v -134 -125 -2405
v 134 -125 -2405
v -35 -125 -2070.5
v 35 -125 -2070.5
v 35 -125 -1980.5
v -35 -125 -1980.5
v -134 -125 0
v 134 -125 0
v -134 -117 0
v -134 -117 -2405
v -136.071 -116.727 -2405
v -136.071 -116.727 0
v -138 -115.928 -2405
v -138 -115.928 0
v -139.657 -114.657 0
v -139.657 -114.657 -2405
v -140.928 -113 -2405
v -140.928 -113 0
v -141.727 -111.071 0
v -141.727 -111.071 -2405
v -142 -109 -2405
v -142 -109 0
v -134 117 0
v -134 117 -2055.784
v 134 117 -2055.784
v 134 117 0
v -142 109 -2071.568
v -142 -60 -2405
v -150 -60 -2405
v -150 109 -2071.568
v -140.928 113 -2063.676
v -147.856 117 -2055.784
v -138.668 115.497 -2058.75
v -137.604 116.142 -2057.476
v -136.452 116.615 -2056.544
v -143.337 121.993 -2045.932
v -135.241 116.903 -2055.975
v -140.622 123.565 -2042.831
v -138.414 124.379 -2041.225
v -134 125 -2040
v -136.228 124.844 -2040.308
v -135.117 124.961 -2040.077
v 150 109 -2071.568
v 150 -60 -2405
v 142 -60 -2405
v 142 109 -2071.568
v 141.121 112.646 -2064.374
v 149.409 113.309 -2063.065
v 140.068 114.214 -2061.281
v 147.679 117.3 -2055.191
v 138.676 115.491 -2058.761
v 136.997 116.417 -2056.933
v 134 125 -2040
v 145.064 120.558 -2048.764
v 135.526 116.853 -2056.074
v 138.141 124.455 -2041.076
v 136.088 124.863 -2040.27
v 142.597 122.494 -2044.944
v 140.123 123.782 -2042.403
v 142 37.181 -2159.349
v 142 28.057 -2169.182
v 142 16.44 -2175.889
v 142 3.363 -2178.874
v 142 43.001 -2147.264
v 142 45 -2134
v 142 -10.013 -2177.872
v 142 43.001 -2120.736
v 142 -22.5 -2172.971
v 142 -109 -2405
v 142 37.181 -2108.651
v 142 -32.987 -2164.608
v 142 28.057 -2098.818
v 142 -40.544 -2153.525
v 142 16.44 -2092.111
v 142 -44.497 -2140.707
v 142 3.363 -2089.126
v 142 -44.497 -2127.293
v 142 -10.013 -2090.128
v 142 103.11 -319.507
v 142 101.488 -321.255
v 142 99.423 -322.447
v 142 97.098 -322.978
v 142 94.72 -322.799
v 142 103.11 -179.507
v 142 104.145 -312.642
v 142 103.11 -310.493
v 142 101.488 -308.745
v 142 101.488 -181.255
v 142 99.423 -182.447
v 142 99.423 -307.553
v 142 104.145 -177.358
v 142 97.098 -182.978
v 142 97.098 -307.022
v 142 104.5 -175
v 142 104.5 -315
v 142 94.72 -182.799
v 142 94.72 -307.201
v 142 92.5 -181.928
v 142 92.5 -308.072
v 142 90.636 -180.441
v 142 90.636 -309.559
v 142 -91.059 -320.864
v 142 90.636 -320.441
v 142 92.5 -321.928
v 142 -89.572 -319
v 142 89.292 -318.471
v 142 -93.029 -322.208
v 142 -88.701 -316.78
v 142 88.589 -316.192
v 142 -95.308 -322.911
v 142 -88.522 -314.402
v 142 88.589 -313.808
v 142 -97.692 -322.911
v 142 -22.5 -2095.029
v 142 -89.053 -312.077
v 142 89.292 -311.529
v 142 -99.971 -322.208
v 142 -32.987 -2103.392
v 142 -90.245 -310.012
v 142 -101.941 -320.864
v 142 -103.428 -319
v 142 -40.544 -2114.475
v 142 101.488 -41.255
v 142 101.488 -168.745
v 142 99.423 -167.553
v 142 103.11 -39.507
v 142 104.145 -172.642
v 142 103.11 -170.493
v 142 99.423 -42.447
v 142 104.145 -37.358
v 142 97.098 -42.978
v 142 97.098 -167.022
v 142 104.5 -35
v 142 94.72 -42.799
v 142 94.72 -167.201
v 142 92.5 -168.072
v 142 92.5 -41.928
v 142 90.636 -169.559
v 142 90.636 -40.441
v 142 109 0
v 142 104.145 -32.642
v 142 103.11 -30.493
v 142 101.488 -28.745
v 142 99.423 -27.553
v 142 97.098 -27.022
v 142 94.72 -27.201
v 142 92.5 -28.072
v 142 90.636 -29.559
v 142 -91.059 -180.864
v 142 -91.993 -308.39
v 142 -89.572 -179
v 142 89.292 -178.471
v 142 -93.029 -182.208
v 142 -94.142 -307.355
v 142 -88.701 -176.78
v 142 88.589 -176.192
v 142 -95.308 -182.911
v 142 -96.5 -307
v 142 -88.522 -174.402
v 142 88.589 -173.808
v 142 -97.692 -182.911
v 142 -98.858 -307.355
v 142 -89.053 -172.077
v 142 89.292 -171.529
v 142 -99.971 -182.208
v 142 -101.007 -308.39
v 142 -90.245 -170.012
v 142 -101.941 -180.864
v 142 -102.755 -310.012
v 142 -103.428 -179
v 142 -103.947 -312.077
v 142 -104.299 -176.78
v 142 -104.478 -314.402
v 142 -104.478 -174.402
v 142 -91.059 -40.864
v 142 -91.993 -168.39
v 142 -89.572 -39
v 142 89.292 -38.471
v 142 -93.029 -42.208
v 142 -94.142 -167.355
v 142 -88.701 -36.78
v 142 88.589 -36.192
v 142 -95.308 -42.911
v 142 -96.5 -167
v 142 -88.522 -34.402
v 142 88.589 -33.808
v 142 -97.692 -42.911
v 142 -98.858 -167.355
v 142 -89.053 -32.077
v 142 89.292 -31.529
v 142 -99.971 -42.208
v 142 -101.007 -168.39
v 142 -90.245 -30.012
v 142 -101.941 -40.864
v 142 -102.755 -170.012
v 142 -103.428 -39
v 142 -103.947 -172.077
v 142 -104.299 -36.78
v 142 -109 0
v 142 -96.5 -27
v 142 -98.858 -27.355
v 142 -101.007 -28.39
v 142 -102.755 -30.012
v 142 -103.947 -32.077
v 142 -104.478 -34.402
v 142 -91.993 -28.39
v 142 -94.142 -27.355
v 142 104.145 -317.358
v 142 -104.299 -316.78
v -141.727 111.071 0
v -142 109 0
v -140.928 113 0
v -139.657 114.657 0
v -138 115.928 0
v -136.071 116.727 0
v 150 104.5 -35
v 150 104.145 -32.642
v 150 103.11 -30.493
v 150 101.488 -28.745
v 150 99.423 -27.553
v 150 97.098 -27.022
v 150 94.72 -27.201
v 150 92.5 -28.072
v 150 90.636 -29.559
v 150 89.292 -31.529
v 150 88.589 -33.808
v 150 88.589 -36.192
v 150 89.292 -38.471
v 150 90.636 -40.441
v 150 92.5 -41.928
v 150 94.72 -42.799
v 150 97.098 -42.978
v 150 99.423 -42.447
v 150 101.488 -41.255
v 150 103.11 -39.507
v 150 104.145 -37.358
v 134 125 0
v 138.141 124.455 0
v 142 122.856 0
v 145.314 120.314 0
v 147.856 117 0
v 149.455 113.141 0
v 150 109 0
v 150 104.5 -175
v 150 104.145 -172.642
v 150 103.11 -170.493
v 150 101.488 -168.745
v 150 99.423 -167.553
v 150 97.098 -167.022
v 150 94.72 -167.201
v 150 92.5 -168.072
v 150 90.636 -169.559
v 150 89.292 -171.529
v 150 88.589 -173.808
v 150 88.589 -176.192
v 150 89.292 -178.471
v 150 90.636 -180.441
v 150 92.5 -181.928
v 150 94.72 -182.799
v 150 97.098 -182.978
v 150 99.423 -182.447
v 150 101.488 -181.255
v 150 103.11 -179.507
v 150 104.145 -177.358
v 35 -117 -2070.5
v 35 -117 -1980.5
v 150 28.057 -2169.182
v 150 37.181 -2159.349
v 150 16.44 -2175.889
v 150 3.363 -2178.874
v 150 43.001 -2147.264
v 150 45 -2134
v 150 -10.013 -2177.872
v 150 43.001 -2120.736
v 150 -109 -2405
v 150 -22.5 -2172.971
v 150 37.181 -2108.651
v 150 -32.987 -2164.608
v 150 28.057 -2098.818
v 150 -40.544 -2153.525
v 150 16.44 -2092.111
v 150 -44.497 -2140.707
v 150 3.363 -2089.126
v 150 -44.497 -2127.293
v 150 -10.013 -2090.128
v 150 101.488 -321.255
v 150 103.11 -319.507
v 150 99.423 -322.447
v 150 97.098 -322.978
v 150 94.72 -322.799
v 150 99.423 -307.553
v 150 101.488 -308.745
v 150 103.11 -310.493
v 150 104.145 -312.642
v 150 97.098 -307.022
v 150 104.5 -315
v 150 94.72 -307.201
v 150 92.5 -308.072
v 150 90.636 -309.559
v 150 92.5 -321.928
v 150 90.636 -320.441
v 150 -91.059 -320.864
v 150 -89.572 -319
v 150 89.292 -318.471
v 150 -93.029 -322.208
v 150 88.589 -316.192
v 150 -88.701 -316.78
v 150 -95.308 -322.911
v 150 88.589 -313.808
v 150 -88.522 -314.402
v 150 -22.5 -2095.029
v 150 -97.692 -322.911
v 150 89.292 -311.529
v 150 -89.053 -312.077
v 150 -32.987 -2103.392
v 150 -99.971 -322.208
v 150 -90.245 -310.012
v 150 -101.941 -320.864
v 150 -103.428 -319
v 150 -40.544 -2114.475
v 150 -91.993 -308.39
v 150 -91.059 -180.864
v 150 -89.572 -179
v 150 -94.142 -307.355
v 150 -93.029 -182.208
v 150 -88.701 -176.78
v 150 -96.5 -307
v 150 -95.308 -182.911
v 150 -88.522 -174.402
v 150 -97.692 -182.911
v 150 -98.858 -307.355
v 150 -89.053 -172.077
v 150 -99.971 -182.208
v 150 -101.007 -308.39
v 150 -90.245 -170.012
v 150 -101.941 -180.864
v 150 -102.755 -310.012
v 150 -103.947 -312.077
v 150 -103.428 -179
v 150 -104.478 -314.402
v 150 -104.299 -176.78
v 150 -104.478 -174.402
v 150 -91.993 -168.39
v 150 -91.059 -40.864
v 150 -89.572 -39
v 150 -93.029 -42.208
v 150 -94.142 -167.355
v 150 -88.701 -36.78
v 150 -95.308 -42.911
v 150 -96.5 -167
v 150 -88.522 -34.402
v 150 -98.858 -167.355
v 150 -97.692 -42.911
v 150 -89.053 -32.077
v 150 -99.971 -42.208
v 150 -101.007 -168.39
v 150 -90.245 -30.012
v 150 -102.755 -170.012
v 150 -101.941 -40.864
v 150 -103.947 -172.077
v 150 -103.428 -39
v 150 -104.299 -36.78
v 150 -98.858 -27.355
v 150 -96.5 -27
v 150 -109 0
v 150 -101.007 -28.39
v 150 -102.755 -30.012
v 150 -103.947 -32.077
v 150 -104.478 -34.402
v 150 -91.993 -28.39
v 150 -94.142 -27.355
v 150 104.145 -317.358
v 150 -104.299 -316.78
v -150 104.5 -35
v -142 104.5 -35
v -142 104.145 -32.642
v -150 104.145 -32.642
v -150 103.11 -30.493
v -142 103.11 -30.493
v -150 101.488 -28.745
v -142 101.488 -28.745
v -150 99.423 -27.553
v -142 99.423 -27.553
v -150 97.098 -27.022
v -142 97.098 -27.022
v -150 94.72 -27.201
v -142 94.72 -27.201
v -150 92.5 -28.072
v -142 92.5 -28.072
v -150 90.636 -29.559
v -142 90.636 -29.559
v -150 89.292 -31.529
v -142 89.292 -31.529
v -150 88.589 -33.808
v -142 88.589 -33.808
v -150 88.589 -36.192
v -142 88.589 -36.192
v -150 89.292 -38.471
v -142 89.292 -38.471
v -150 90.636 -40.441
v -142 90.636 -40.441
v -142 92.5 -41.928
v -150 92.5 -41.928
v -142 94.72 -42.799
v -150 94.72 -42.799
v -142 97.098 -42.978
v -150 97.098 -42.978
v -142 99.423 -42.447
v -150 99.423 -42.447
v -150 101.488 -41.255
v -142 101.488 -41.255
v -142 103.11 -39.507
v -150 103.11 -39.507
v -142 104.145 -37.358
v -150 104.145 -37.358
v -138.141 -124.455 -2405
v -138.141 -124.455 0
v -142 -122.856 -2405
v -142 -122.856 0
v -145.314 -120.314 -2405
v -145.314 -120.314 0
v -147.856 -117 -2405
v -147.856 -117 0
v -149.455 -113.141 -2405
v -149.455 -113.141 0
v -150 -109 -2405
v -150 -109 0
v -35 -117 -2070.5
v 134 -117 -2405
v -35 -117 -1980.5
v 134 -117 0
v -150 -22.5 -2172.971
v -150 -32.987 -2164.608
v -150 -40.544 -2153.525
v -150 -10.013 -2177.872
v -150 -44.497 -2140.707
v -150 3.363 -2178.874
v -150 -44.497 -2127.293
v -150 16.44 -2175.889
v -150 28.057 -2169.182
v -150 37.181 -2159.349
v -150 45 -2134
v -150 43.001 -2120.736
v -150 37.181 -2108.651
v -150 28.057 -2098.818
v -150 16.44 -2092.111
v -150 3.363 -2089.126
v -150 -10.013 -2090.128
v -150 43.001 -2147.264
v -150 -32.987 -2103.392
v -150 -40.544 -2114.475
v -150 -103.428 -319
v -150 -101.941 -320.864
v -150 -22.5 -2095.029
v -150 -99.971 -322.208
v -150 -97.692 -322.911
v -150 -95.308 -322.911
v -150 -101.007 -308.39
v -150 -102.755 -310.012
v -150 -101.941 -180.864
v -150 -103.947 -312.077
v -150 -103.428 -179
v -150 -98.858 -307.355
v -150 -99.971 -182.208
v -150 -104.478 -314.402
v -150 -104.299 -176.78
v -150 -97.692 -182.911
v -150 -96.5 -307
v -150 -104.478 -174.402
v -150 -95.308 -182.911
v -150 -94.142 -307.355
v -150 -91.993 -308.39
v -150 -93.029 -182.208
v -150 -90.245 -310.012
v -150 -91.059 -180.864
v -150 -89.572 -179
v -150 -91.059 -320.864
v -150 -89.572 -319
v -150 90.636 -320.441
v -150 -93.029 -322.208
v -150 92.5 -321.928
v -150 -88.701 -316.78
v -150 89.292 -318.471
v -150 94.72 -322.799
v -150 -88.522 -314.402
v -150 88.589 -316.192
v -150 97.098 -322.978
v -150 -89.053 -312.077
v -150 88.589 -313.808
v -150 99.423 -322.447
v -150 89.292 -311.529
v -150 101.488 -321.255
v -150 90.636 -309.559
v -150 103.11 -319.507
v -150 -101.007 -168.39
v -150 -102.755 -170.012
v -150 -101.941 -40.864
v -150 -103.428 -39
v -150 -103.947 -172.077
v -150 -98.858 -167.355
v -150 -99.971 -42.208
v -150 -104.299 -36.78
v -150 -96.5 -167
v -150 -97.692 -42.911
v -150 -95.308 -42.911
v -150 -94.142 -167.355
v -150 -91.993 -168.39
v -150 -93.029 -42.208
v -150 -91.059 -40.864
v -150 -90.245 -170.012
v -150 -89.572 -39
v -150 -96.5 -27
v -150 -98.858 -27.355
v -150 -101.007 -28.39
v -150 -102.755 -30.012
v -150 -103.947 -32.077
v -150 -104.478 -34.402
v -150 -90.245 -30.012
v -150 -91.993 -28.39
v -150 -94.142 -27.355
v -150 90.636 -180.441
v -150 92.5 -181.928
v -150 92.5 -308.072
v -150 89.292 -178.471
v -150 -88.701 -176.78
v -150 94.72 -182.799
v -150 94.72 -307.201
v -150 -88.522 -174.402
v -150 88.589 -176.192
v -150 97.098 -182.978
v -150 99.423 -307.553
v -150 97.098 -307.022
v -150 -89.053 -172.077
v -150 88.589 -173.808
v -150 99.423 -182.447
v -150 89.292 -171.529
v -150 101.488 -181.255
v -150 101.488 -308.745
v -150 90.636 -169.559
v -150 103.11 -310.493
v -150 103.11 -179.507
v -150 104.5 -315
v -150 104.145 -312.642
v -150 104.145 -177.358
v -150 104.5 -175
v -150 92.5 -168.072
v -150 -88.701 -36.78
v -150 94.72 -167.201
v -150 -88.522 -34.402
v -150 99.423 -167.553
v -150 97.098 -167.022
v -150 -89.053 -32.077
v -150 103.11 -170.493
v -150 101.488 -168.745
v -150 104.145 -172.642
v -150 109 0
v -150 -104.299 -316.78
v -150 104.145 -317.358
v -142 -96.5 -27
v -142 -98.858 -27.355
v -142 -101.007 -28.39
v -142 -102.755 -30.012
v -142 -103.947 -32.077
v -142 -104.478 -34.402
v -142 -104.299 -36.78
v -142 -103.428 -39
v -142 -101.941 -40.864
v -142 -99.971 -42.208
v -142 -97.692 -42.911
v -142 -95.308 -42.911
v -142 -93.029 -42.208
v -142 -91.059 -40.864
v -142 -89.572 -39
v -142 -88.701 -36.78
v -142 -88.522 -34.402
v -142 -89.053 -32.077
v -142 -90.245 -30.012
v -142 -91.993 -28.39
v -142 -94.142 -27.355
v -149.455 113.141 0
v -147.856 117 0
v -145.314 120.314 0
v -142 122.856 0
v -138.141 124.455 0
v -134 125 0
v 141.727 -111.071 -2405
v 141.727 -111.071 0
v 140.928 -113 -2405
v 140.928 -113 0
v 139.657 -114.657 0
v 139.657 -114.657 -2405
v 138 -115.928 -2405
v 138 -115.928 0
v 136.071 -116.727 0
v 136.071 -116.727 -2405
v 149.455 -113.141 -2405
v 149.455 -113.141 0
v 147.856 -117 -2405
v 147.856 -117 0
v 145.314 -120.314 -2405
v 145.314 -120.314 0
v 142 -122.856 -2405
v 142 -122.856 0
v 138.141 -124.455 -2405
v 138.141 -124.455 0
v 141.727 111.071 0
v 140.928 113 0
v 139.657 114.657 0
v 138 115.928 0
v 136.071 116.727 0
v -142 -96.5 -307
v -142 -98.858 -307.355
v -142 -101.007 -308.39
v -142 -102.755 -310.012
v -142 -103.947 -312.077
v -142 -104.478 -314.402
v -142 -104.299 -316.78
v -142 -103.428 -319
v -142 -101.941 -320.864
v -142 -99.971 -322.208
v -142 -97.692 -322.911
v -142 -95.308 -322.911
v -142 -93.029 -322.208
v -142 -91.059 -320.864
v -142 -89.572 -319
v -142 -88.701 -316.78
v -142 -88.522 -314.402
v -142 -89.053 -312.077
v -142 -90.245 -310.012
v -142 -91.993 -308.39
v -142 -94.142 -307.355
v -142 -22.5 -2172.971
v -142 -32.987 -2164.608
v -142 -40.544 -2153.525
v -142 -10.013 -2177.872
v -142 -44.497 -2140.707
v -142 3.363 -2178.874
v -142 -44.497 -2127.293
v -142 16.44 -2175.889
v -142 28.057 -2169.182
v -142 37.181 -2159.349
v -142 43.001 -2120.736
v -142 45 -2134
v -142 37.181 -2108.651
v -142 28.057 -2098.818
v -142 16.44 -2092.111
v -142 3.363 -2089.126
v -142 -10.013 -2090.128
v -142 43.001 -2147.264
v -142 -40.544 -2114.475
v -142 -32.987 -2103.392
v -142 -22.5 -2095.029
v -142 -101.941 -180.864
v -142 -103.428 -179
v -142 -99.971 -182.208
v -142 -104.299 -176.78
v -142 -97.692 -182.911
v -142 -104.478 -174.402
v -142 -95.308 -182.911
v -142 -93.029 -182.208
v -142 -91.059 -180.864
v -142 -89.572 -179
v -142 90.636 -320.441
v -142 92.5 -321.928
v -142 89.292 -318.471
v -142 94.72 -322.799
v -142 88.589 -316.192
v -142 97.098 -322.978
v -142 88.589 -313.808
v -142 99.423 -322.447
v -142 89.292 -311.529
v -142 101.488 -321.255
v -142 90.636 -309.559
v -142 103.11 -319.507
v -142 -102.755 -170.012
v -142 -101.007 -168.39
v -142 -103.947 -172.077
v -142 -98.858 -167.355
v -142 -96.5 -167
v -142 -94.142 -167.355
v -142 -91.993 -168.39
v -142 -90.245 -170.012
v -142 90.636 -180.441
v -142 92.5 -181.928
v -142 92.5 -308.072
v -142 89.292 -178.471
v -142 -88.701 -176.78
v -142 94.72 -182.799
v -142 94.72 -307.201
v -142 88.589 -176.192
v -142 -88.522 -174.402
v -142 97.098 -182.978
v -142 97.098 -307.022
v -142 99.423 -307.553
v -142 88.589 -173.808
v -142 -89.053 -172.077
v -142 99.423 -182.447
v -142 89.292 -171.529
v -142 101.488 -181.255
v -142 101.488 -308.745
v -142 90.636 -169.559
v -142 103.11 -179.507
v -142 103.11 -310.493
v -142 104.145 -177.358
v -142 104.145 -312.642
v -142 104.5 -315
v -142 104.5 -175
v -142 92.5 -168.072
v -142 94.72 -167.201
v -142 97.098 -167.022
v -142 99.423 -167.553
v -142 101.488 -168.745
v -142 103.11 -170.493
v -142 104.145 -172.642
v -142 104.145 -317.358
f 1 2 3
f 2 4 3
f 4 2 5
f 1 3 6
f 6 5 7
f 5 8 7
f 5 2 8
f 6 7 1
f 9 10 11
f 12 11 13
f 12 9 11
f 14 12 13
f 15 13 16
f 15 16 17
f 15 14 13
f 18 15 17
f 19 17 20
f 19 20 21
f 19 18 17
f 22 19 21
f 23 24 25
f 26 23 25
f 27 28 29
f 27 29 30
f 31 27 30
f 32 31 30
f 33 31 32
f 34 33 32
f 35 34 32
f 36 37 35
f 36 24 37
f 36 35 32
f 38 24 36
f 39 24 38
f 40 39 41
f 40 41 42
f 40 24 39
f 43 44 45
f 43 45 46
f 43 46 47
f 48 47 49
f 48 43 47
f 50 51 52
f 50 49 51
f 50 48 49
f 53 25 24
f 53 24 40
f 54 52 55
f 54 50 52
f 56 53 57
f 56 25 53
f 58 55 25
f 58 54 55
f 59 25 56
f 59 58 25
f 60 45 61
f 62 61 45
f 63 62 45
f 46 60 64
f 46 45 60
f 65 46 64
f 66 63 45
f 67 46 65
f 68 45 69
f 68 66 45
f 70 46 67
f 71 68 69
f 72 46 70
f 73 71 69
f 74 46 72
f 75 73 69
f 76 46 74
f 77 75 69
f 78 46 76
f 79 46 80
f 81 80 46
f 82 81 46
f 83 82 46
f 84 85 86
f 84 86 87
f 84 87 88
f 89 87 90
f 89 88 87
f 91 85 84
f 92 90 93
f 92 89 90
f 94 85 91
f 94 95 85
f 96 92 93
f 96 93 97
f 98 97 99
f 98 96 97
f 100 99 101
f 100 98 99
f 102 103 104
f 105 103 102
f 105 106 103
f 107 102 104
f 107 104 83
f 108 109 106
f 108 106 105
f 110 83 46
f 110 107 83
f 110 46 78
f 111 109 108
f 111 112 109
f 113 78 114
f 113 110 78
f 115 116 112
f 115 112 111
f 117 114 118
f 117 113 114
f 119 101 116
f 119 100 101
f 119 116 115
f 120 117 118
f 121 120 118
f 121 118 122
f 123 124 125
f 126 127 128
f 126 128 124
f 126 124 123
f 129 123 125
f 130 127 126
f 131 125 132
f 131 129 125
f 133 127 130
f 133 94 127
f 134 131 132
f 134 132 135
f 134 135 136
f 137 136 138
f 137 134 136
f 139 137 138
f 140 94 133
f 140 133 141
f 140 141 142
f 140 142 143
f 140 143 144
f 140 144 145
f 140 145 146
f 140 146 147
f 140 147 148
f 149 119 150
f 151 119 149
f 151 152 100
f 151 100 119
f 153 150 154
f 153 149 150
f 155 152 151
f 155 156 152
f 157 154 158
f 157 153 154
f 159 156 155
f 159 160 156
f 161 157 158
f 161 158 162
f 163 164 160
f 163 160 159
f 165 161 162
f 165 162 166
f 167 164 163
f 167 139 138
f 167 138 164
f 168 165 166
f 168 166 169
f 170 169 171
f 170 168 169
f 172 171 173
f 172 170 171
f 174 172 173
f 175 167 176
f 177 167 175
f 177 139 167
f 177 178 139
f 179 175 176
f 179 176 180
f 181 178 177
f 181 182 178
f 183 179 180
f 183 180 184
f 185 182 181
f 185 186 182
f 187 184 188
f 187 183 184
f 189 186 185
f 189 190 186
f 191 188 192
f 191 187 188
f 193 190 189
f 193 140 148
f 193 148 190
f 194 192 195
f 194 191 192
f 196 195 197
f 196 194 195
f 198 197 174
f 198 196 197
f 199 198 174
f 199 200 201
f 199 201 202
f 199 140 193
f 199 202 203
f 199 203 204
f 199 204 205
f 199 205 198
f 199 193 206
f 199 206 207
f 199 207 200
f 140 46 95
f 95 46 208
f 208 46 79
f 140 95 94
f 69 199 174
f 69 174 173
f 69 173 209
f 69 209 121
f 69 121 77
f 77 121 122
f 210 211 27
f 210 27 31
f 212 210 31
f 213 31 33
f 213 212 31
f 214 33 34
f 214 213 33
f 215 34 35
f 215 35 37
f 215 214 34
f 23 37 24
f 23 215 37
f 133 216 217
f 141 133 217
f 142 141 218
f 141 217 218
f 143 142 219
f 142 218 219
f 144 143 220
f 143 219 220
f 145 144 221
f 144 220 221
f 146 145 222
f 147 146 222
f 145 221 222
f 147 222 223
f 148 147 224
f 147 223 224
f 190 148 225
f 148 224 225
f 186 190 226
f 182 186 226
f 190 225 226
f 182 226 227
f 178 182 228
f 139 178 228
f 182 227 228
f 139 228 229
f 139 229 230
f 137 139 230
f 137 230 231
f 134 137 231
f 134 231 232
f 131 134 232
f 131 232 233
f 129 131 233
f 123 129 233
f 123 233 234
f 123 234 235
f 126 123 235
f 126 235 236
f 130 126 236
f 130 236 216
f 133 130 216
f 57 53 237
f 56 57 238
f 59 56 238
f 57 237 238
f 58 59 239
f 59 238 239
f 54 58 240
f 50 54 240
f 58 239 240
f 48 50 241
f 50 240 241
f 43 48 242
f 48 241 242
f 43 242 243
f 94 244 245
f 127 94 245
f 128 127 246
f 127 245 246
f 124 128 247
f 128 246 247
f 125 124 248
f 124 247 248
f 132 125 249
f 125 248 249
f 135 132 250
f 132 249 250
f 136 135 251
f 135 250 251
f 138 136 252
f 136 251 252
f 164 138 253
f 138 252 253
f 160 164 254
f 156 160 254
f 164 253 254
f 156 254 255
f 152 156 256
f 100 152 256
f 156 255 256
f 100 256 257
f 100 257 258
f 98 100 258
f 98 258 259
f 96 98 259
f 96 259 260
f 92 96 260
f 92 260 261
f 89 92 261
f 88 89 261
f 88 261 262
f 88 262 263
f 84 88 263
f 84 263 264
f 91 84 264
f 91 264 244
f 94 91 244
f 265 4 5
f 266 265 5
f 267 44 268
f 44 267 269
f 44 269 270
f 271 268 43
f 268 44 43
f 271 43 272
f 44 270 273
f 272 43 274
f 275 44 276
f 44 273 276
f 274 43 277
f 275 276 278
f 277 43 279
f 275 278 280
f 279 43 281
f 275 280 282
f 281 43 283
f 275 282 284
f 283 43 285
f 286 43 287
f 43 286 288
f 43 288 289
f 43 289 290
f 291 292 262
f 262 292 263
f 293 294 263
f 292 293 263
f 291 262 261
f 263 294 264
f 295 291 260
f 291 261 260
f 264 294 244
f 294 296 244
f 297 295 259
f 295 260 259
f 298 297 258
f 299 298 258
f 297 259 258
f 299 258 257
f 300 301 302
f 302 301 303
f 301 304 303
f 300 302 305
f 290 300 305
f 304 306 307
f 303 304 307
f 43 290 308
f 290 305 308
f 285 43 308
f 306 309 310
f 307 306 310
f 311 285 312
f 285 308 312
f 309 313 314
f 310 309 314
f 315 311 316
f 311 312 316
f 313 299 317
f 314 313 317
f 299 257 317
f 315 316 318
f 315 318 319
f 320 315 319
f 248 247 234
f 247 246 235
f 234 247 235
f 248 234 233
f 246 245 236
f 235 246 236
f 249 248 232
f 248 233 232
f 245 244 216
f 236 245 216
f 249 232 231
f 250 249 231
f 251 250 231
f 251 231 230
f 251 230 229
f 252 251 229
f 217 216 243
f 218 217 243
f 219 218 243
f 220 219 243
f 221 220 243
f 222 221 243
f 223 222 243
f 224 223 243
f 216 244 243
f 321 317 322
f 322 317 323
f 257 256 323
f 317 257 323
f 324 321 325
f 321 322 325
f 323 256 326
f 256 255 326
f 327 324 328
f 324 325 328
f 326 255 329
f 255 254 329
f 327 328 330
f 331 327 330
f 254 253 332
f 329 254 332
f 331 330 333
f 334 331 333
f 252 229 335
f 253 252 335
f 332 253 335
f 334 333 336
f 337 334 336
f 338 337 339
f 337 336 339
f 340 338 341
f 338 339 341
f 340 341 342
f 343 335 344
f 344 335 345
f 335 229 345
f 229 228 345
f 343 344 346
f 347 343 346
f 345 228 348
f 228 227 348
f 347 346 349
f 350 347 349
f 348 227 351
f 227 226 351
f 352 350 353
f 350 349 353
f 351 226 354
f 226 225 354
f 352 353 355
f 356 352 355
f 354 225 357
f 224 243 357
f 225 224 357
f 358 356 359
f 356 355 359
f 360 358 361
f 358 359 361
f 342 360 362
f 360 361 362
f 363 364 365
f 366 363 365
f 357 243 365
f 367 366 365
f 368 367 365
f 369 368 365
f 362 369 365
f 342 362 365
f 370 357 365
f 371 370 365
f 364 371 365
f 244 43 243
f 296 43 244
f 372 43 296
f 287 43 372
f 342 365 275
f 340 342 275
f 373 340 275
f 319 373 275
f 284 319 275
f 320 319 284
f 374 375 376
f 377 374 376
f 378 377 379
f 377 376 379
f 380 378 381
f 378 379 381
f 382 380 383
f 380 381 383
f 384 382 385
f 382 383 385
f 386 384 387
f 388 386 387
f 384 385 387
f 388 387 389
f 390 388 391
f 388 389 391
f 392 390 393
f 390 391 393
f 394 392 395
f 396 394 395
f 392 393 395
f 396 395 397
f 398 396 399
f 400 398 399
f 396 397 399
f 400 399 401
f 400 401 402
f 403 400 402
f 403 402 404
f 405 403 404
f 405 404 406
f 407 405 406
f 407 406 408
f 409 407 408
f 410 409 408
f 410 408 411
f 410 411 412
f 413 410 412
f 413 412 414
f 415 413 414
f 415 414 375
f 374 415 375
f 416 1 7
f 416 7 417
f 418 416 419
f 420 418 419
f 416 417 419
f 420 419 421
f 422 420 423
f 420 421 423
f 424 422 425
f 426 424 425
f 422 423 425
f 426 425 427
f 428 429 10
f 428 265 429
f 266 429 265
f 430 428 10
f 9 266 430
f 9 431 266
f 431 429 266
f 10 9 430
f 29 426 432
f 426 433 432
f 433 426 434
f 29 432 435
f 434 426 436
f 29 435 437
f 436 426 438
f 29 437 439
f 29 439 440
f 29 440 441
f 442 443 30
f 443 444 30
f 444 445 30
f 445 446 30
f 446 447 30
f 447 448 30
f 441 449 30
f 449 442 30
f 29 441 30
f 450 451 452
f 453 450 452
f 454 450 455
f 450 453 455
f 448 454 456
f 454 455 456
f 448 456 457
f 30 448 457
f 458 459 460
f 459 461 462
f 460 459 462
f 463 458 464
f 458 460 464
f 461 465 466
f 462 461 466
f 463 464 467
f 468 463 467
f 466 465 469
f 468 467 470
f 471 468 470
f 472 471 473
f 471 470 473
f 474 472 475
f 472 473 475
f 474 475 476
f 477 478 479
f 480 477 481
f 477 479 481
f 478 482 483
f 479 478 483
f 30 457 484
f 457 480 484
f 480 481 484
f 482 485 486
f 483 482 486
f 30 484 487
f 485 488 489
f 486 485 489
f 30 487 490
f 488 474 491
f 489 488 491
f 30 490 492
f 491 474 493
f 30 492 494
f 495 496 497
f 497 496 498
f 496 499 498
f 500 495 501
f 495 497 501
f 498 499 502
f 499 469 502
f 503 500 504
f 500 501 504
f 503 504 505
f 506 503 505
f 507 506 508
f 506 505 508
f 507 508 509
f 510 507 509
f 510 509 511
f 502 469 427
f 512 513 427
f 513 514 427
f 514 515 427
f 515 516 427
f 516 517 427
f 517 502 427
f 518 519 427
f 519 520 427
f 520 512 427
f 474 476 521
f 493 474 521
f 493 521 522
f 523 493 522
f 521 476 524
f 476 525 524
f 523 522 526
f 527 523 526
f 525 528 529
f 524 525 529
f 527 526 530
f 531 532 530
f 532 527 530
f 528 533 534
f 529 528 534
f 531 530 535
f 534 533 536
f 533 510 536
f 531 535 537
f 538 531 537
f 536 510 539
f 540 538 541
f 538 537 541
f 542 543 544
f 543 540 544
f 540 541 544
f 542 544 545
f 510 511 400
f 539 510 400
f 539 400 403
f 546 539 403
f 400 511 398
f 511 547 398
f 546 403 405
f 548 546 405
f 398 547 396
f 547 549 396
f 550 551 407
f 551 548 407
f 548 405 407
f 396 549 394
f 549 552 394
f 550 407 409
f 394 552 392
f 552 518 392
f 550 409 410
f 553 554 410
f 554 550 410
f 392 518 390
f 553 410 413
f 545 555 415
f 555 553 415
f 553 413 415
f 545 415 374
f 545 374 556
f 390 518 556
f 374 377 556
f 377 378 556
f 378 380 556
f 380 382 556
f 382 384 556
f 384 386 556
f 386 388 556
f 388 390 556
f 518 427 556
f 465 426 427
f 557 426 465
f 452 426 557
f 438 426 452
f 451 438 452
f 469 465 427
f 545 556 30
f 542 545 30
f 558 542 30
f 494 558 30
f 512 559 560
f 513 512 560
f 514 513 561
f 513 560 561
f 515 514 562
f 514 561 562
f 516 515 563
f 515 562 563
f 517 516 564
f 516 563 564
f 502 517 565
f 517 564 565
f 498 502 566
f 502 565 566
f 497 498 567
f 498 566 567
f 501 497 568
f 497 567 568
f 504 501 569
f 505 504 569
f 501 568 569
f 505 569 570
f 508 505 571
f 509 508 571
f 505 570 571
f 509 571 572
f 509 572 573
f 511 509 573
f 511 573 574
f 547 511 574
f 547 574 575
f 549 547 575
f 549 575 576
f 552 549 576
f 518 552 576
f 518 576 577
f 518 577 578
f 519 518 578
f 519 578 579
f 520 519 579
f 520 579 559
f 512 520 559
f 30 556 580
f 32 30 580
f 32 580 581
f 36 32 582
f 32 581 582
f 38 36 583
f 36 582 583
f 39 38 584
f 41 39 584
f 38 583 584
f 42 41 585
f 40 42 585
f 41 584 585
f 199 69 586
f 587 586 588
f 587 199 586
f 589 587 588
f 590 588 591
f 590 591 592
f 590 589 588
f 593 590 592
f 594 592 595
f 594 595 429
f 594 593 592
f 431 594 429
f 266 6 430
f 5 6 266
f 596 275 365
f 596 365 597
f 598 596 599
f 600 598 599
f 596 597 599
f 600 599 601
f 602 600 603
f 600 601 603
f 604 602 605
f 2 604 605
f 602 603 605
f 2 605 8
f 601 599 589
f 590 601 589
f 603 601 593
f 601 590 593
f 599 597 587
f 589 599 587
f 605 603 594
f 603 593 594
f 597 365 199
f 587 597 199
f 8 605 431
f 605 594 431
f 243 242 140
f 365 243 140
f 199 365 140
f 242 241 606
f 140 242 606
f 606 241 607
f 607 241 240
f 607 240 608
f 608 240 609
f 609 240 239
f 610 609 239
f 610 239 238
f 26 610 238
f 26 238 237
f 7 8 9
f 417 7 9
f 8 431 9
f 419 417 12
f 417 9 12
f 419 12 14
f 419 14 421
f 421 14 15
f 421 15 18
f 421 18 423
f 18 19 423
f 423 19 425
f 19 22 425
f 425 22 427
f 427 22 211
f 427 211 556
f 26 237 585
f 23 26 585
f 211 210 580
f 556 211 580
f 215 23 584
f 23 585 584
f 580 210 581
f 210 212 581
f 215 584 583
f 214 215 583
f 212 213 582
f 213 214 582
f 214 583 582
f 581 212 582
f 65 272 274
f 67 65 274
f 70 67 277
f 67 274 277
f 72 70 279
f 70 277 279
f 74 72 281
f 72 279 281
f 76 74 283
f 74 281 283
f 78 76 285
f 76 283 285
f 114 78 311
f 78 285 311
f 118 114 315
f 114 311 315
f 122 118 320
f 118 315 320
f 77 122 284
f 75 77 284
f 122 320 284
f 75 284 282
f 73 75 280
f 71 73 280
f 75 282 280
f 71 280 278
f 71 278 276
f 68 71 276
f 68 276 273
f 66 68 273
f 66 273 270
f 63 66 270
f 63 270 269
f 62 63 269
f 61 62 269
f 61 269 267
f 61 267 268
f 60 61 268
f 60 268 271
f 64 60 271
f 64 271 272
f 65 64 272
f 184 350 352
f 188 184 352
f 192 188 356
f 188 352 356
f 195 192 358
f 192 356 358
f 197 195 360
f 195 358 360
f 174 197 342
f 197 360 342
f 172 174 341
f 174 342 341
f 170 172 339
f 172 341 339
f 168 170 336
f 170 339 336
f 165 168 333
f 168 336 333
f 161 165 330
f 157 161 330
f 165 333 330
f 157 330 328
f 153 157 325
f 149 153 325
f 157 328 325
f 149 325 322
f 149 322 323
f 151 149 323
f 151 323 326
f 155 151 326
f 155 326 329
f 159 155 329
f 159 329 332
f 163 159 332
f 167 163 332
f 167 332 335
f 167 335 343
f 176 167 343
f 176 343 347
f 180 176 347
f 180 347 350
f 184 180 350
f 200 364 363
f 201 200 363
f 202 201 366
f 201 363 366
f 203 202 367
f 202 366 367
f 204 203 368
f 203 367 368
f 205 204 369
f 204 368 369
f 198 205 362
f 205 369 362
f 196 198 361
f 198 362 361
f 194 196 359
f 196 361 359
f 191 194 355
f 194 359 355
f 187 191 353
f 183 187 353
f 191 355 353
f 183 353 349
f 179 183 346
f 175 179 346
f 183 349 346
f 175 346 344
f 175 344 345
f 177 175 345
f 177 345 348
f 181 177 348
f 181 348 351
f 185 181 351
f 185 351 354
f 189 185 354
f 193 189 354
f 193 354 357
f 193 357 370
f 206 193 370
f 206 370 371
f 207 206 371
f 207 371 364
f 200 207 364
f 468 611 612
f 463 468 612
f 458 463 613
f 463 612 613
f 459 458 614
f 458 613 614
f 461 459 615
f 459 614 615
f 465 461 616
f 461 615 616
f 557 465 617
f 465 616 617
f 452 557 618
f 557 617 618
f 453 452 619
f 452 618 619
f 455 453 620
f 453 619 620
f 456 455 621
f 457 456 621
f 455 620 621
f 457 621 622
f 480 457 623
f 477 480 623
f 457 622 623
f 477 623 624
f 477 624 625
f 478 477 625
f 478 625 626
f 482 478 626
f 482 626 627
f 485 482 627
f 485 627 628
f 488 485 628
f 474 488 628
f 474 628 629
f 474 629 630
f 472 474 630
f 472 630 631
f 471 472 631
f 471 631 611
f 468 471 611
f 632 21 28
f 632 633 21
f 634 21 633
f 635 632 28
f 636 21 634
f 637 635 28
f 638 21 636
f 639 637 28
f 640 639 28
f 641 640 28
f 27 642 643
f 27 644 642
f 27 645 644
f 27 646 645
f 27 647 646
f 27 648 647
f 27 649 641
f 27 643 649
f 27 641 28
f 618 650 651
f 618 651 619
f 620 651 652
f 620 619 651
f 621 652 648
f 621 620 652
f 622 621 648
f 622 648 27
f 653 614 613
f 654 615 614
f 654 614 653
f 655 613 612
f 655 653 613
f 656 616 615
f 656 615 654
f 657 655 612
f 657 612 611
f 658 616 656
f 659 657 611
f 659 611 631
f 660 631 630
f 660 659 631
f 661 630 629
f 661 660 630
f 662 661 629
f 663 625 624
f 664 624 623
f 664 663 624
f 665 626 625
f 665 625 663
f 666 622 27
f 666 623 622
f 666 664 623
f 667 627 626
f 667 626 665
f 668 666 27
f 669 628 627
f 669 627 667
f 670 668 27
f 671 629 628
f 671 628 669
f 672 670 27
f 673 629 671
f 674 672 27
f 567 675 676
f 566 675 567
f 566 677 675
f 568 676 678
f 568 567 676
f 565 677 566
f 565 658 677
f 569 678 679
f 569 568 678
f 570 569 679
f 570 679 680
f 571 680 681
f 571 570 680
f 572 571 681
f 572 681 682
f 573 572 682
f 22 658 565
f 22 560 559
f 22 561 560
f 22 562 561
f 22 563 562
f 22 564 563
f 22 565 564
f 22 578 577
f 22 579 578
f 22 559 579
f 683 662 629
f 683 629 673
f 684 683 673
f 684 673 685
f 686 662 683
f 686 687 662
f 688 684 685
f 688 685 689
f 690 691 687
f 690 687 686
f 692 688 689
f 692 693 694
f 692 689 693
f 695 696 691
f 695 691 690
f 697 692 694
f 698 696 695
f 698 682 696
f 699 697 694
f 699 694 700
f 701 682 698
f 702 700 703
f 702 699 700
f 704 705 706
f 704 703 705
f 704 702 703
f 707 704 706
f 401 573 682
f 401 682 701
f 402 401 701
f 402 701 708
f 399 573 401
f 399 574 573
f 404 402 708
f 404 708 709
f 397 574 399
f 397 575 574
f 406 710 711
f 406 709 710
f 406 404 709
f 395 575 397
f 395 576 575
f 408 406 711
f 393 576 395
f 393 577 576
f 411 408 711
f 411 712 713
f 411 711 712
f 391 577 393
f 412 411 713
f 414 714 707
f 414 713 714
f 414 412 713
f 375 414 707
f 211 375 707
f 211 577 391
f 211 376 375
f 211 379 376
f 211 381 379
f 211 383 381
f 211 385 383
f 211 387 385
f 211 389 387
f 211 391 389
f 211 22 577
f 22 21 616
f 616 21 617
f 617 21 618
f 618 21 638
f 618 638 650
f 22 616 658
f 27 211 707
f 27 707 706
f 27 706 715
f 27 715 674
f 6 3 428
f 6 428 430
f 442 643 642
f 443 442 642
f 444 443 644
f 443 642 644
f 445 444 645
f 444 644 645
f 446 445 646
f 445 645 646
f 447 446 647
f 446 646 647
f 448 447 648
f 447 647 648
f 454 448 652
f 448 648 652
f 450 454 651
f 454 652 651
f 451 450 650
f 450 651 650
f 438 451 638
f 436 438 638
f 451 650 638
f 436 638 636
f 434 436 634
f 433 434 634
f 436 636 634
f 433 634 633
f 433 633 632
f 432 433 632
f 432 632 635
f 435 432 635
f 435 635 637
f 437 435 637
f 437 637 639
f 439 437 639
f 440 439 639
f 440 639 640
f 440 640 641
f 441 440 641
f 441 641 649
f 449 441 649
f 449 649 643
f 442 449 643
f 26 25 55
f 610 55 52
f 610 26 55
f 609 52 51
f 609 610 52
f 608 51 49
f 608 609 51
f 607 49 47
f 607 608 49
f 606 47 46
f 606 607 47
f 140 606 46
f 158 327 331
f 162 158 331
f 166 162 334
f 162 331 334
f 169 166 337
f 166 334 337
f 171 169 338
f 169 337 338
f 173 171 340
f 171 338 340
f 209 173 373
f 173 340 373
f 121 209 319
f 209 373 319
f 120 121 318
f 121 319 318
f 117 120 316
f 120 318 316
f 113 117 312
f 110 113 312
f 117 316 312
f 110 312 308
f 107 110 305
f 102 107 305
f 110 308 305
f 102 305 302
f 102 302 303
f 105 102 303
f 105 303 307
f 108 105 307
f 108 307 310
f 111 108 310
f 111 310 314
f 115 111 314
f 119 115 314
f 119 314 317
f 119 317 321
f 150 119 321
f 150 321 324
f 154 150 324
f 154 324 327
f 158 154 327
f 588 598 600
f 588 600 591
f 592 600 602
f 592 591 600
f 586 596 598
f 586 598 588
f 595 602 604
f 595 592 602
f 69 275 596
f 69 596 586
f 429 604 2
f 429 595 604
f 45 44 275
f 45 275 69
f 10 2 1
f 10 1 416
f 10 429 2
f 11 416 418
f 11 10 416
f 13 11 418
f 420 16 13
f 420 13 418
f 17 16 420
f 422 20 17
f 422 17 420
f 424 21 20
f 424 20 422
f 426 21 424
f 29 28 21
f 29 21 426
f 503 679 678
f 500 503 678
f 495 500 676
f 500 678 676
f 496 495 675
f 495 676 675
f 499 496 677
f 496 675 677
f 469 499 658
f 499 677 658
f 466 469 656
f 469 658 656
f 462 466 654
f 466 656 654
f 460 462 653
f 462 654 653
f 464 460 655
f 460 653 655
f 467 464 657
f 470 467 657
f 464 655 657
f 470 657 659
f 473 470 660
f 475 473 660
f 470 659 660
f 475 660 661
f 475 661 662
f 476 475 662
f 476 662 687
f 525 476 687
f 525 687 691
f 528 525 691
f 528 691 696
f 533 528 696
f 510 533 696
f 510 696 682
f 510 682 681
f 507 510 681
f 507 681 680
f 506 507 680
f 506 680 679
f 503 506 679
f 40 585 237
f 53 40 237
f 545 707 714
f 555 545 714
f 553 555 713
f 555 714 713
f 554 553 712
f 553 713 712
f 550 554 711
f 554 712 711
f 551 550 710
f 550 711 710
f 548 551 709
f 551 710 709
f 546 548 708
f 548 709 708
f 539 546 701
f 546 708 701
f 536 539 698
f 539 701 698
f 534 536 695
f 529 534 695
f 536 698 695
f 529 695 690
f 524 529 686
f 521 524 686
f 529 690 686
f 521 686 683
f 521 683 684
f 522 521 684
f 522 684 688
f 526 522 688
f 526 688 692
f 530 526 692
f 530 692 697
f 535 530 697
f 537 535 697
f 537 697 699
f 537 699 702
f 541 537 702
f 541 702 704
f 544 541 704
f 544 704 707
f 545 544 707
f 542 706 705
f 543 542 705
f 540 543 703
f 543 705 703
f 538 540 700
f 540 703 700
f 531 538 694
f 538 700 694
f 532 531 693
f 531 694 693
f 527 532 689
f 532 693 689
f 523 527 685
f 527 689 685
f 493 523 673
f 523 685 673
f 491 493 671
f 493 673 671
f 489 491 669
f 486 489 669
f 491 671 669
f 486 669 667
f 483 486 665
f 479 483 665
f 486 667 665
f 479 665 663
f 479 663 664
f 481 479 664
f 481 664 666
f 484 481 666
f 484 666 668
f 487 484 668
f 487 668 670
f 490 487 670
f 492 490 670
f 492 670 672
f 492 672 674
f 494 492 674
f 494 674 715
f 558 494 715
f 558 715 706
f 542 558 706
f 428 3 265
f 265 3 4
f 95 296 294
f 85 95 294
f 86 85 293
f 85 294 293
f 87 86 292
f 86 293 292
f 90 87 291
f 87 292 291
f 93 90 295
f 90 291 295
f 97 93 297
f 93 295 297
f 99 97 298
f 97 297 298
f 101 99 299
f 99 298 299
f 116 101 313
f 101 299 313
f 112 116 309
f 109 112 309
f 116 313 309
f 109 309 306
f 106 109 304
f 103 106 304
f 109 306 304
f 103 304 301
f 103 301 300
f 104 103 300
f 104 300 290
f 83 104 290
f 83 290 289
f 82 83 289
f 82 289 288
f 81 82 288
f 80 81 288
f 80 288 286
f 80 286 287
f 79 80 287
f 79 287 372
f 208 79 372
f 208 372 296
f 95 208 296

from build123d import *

# Parameters (mm, degrees)
EXTRUDE_1_DEPTH     = 2405
SKETCH_2_R          = 8
SKETCH_2_R_2        = 45
CUT_EXTRUDE_1_DEPTH = 2427.860111337
CUT_EXTRUDE_2_REACH = 2424.607
SKETCH_3_W          = 70
SKETCH_3_H          = 90


with BuildPart() as part:
    # 草图1 → 凸台-拉伸1 (new body)
    with BuildSketch(Plane.XY):
        with BuildLine():
            Line((-134, 125), (134, 125))
            ThreePointArc((134, 125), (145.313708499, 120.313708499), (150, 109))
            Line((150, 109), (150, -109))
            ThreePointArc((150, -109), (145.313708499, -120.313708499), (134, -125))
            Line((134, -125), (-134, -125))
            ThreePointArc((-134, -125), (-145.313708499, -120.313708499), (-150, -109))
            Line((-150, -109), (-150, 109))
            ThreePointArc((-150, 109), (-145.313708499, 120.313708499), (-134, 125))
        make_face()
        with BuildLine():
            Line((-134, 117), (134, 117))
            ThreePointArc((134, 117), (139.656854249, 114.656854249), (142, 109))
            Line((142, 109), (142, -109))
            ThreePointArc((142, -109), (139.656854249, -114.656854249), (134, -117))
            Line((134, -117), (-134, -117))
            ThreePointArc((-134, -117), (-139.656854249, -114.656854249), (-142, -109))
            Line((-142, -109), (-142, 109))
            ThreePointArc((-142, 109), (-139.656854249, 114.656854249), (-134, 117))
        make_face(mode=Mode.SUBTRACT)
    extrude(amount=-EXTRUDE_1_DEPTH)

    # 草图2 → 切除-拉伸1 (cut, through all)
    with BuildSketch(Plane(origin=(150, 0, 0), x_dir=(0, 0, -1), z_dir=(1, 0, 0))):
        with Locations(Location((35, 96.5, 0), (0, 0, 90))):
            Circle(SKETCH_2_R)
        with Locations(Location((175, 96.5, 0), (0, 0, 90))):
            Circle(SKETCH_2_R)
        with Locations(Location((315, 96.5, 0), (0, 0, 90))):
            Circle(SKETCH_2_R)
        with Locations(Location((2134, 0, 0), (0, 0, 90))):
            Circle(SKETCH_2_R_2)
        with Locations(Location((315, -96.5, 0), (0, 0, 180))):
            Circle(SKETCH_2_R)
        with Locations(Location((175, -96.5, 0), (0, 0, 180))):
            Circle(SKETCH_2_R)
        with Locations(Location((35, -96.5, 0), (0, 0, 180))):
            Circle(SKETCH_2_R)
        Polygon((2405, -60), (2040, 125), (2405, 125), align=None)
    extrude(amount=-CUT_EXTRUDE_1_DEPTH, mode=Mode.SUBTRACT)

    # 草图3 → 切除-拉伸2 (cut, up to next)
    with BuildSketch(Plane.XZ.offset(125), mode=Mode.PRIVATE) as cut_extrude_2_sk1:
        with Locations((0, -2025.5)):
            Rectangle(SKETCH_3_W, SKETCH_3_H)
    cut_extrude_2_tool1 = extrude(cut_extrude_2_sk1.sketch, amount=-CUT_EXTRUDE_2_REACH, mode=Mode.PRIVATE) & part.part
    add(cut_extrude_2_tool1.solids().sort_by_distance((0, -125, -2025.5))[0], mode=Mode.SUBTRACT)


solid = part.part
